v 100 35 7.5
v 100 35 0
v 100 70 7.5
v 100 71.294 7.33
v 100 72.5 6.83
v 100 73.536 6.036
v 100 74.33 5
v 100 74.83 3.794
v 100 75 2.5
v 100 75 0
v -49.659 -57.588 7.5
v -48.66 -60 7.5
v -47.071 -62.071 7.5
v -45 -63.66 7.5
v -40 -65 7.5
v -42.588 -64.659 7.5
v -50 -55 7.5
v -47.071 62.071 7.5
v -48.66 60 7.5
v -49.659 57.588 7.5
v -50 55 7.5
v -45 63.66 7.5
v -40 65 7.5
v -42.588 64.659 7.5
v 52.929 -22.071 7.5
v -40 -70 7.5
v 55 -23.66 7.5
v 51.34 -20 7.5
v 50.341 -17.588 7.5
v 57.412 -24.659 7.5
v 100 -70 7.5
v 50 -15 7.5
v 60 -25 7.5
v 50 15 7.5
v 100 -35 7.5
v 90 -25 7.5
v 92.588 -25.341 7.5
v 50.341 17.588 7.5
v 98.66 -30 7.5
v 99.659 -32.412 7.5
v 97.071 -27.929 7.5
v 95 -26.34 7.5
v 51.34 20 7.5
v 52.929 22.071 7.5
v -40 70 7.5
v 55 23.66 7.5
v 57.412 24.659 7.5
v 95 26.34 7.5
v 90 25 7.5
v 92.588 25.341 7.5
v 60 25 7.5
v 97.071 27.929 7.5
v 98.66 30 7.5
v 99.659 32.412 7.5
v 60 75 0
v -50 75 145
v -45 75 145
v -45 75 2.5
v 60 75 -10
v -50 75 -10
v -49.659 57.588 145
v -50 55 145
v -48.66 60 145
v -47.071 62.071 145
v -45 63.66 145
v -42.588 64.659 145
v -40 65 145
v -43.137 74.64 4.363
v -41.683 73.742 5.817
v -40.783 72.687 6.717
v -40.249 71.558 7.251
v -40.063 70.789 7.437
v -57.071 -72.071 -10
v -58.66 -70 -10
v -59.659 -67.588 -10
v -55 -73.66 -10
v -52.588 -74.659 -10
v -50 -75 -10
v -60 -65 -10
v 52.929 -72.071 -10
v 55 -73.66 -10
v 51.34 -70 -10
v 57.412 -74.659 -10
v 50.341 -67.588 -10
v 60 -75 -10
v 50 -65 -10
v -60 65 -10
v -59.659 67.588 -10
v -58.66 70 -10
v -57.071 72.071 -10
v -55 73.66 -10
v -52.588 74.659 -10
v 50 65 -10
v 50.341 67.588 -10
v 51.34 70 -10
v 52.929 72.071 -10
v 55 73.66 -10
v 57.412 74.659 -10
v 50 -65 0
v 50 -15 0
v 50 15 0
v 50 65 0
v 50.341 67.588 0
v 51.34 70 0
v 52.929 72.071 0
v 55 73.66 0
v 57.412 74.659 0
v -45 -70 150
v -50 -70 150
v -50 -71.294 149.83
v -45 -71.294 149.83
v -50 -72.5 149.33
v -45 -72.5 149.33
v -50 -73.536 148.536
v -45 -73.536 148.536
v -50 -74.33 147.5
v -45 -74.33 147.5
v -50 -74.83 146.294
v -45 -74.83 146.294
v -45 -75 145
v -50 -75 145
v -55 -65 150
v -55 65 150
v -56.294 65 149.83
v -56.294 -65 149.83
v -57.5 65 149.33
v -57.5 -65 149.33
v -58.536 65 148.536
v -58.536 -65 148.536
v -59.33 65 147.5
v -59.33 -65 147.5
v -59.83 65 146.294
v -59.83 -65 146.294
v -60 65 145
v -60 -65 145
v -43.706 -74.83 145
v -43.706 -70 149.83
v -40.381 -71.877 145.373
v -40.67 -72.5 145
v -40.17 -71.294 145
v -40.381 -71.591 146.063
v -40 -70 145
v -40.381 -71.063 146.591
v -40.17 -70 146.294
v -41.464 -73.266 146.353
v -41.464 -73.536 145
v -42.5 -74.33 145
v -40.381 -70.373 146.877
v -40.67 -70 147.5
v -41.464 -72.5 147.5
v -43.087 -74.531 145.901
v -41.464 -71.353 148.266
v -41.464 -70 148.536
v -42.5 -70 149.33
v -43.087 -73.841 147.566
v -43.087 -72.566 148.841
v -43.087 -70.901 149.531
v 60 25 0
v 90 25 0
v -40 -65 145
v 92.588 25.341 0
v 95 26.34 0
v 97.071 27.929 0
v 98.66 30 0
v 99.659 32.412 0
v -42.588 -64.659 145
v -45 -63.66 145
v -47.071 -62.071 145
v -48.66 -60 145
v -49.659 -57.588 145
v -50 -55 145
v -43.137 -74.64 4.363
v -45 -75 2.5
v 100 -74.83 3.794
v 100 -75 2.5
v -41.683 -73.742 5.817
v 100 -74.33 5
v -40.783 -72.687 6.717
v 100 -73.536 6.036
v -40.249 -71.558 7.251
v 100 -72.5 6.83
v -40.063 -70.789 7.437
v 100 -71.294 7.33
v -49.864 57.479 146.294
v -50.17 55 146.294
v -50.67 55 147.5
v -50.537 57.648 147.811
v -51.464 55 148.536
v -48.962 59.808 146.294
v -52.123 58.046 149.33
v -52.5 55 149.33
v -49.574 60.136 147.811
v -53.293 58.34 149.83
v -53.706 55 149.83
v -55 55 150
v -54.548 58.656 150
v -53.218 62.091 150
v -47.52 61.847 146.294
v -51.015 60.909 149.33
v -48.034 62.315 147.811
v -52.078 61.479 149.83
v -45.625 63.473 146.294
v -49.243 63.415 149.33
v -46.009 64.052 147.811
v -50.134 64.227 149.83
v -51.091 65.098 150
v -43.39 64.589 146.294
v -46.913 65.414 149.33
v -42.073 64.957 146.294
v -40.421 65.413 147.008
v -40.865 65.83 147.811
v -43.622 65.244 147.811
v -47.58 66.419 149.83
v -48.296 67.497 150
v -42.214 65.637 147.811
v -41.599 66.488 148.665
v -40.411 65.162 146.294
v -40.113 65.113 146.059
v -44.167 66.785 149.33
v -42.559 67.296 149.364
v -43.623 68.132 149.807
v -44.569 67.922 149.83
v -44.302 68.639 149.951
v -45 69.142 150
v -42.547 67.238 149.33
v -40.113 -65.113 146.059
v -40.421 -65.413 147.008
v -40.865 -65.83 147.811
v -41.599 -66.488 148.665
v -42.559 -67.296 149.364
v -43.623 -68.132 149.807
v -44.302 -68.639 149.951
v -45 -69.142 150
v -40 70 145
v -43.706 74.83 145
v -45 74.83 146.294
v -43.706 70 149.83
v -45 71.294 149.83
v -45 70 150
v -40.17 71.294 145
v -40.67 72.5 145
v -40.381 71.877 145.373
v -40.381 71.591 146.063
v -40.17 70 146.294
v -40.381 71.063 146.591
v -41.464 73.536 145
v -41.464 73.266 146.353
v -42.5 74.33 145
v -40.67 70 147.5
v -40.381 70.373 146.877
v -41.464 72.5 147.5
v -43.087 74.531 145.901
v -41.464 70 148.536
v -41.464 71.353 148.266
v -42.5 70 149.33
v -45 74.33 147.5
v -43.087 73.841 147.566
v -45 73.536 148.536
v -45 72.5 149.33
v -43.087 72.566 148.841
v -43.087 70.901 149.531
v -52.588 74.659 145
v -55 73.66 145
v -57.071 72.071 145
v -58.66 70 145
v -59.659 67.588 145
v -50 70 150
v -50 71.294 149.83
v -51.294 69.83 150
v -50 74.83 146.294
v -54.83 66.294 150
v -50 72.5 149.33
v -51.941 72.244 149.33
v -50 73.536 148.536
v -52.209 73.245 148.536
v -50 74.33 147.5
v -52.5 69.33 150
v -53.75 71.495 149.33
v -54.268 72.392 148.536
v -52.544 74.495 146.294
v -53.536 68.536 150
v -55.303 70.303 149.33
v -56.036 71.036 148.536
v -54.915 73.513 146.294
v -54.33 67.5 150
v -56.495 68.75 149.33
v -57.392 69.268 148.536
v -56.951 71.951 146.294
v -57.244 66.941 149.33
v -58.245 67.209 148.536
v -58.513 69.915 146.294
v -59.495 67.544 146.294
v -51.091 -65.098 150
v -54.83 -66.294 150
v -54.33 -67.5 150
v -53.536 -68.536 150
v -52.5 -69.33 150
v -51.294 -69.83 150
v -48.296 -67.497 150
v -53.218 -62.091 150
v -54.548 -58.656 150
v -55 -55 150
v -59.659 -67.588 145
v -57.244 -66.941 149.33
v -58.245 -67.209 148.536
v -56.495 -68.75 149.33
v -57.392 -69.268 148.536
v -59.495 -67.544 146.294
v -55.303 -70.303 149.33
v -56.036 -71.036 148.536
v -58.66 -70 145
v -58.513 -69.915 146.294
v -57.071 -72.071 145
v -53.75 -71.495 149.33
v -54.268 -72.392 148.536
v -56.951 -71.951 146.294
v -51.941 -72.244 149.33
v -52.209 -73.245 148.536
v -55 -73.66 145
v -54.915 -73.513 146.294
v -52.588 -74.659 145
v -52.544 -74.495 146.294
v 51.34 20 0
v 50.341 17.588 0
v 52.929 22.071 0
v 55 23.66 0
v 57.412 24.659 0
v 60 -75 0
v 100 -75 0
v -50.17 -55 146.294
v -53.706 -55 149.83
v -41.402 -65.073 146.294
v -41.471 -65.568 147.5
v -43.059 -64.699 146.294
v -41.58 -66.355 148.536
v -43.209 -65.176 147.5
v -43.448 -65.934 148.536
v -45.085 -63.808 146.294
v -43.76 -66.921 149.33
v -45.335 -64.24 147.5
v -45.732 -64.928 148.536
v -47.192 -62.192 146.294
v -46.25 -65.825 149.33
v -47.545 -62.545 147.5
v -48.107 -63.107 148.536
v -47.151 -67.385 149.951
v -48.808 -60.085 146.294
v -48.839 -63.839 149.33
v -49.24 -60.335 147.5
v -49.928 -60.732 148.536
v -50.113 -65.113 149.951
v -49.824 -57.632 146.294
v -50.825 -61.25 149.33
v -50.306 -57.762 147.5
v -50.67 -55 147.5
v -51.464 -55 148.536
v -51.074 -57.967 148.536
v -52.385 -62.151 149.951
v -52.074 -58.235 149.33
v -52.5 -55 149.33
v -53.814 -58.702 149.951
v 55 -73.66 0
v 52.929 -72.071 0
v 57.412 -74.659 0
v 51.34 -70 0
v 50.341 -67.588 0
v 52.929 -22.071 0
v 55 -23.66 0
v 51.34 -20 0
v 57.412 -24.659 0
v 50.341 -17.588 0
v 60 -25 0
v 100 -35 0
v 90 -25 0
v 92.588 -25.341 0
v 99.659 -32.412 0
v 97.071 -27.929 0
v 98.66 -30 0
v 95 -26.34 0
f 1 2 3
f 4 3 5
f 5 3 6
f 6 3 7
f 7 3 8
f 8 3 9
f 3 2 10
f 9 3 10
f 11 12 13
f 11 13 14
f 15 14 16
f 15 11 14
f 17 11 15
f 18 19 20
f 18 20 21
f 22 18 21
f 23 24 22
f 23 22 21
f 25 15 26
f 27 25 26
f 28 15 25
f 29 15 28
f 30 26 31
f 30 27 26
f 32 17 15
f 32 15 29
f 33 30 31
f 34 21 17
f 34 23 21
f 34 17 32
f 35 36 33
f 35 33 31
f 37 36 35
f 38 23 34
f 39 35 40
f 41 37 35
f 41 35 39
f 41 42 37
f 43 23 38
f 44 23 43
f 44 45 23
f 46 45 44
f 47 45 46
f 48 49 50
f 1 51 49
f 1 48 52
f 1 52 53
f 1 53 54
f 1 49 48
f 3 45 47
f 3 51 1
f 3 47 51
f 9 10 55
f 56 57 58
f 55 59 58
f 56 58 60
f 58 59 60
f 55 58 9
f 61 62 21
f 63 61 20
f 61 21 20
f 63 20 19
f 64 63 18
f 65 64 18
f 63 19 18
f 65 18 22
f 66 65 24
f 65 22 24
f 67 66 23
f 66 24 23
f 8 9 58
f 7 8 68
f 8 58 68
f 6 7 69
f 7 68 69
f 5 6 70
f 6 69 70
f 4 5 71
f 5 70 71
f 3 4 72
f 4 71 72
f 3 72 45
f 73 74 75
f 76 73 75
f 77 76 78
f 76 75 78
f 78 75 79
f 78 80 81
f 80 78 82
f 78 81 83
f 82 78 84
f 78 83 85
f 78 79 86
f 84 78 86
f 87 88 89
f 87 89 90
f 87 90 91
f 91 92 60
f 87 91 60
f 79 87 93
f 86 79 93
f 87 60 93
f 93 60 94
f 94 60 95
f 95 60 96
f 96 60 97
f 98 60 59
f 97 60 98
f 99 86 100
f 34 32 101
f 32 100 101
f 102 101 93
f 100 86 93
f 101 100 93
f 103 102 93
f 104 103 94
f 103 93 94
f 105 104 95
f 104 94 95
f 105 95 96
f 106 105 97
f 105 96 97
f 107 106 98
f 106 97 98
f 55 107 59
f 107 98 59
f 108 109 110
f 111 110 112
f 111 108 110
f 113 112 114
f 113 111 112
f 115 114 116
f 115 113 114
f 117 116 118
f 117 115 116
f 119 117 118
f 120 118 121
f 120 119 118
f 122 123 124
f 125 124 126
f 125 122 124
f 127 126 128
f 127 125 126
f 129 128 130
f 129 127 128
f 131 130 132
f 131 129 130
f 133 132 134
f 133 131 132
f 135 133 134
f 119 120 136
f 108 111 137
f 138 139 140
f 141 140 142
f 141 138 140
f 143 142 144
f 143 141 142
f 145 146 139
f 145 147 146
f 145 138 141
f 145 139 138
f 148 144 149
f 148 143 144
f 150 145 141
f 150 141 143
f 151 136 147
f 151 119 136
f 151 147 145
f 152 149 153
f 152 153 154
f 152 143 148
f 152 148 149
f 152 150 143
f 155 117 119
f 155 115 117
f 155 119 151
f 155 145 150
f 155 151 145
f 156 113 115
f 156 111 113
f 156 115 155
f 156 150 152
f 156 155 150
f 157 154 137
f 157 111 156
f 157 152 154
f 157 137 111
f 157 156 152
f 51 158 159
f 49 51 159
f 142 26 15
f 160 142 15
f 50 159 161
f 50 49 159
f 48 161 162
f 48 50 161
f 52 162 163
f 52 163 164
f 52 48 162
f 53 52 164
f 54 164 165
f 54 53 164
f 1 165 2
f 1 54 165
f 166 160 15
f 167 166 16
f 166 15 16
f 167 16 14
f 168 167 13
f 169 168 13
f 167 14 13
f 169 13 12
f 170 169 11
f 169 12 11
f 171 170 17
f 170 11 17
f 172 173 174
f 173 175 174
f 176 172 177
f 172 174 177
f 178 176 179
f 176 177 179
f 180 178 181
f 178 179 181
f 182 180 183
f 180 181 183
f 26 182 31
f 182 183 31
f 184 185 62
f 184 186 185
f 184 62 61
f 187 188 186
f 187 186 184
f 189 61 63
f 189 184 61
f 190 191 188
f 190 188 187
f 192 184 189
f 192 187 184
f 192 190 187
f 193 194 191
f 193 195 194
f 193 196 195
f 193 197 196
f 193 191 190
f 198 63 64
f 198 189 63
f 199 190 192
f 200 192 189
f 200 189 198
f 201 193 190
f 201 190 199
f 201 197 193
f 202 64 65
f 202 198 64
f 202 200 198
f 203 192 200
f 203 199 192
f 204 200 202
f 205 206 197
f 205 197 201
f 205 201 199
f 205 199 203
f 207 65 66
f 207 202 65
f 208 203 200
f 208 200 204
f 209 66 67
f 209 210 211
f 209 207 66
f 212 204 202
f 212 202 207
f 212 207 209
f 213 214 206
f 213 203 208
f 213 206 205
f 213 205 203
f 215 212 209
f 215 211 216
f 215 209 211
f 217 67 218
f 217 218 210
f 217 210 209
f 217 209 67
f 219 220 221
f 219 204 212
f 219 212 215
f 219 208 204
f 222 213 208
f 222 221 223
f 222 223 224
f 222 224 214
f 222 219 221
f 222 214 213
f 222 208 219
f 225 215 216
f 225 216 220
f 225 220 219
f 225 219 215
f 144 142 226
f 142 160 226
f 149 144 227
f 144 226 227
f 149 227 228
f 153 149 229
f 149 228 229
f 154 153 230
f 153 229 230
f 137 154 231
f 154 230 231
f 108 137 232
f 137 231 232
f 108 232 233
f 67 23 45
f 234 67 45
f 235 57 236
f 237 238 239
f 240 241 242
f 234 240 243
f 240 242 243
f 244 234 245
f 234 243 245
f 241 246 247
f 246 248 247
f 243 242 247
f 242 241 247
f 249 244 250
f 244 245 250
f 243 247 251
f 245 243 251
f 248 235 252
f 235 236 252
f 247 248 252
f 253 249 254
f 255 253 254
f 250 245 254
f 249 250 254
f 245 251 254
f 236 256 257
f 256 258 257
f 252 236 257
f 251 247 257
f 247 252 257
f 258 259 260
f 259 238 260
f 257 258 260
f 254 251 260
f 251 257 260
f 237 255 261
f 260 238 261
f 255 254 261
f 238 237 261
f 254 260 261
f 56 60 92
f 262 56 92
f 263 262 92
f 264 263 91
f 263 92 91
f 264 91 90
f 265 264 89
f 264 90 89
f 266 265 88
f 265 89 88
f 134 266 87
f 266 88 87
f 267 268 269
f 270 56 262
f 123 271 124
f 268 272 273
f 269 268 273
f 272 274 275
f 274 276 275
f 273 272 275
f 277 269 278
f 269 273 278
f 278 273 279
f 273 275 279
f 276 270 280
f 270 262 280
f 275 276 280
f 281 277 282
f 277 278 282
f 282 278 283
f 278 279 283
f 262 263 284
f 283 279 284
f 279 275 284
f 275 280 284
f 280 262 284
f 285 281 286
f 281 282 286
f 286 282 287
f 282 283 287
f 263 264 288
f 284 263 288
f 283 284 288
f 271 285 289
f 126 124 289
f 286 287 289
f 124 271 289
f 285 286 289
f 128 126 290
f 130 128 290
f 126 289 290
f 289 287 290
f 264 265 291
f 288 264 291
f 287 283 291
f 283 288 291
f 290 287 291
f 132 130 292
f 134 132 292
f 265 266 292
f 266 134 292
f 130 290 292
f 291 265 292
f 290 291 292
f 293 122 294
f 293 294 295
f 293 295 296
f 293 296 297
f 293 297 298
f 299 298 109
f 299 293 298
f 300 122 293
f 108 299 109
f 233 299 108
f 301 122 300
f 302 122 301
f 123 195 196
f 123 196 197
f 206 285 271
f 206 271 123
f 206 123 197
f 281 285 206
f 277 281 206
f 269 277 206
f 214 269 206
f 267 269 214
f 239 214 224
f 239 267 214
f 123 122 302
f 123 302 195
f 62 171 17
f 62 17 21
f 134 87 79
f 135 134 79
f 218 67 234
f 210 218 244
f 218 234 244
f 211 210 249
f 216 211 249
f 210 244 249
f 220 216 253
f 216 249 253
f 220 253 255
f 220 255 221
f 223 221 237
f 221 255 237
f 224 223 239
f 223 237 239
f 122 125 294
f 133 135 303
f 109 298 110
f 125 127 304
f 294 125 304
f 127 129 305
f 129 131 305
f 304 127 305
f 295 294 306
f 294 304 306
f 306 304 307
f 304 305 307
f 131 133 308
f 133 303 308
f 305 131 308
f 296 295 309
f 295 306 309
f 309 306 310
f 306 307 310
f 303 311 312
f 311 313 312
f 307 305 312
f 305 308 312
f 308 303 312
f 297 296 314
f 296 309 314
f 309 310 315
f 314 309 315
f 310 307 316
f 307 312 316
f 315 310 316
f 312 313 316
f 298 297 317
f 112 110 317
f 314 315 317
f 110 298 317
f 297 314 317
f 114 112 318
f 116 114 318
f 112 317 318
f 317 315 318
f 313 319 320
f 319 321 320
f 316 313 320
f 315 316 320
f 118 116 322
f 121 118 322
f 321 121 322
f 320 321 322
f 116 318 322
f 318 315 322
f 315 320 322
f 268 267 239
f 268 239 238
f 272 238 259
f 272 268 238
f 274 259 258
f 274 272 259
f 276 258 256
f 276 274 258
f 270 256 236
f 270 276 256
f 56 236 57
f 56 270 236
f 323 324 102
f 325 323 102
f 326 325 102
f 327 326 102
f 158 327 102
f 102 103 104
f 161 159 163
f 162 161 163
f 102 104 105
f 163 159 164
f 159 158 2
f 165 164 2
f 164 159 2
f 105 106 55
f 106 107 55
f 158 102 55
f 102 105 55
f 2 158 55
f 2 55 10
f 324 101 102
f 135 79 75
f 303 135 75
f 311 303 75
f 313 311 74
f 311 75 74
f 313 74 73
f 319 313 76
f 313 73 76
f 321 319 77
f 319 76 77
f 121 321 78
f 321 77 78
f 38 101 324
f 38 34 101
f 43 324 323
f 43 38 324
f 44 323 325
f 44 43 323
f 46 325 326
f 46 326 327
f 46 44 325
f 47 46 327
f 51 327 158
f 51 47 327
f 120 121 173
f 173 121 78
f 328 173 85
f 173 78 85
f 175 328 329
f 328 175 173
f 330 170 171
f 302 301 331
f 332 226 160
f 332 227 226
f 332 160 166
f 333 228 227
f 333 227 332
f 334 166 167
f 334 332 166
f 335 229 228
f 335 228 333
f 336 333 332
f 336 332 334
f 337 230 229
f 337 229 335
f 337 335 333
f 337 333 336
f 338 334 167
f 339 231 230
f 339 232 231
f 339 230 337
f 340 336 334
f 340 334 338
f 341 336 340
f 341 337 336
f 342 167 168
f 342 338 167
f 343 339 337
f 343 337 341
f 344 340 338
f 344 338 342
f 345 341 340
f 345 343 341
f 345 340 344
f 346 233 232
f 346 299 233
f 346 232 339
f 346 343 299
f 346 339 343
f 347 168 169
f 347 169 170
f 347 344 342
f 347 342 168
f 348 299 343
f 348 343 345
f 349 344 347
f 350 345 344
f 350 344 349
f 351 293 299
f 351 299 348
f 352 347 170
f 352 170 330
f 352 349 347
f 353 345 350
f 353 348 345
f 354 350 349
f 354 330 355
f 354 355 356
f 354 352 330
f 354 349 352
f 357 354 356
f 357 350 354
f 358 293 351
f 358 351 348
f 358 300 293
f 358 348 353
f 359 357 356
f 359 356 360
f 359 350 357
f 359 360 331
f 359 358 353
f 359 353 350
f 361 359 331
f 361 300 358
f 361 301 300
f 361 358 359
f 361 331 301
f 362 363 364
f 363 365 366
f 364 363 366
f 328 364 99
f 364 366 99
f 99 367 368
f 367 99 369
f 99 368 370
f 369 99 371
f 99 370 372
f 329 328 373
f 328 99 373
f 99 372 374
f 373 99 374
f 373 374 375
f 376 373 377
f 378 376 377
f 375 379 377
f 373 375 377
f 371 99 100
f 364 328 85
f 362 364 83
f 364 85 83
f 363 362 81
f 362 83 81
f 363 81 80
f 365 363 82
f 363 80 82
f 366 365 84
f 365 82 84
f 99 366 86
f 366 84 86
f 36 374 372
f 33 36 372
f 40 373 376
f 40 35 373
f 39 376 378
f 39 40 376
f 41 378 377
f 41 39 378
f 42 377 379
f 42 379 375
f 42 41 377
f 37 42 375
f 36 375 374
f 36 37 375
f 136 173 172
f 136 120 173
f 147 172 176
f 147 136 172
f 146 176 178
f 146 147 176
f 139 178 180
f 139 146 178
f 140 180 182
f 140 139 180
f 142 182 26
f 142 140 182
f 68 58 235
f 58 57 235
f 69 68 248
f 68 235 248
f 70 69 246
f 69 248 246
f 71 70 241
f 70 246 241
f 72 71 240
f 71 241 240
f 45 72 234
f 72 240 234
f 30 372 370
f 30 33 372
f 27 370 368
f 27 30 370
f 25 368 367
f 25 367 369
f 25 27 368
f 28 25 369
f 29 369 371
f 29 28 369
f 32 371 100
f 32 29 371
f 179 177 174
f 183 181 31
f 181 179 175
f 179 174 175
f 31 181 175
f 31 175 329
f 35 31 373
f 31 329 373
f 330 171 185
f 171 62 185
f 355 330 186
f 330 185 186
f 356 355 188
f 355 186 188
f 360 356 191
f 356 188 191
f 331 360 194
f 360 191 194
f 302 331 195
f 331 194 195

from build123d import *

# Parameters (mm, degrees)
BOSS_EXTRUDE1_DEPTH = 7.5
BOSS_EXTRUDE2_DEPTH = 150
BOSS_EXTRUDE3_START = -10
BOSS_EXTRUDE3_DEPTH = 10
FILLET1_R           = 5
FILLET2_R           = 10
FILLET3_R           = 10


with BuildPart() as part:
    # Sketch1 → Boss-Extrude1 (new body)
    with BuildSketch(Plane.XY):
        with BuildLine():
            Line((-40, 75), (-40, 65))
            ThreePointArc((-40, 65), (-47.071067812, 62.071067812), (-50, 55))
            Line((-50, 55), (-50, -55))
            ThreePointArc((-50, -55), (-47.071067812, -62.071067812), (-40, -65))
            Line((-40, -65), (-40, -75))
            Line((-40, -75), (100, -75))
            Line((100, -75), (100, -25))
            Line((100, -25), (50, -25))
            Line((50, -25), (50, 25))
            Line((50, 25), (100, 25))
            Line((100, 25), (100, 75))
            Line((100, 75), (-40, 75))
        make_face()
    extrude(amount=BOSS_EXTRUDE1_DEPTH)

    # Sketch1<5> → Boss-Extrude2 (add)
    with BuildSketch(Plane.XY):
        with BuildLine():
            ThreePointArc((-50, 55), (-47.071067812, 62.071067812), (-40, 65))
            Line((-40, 65), (-40, 75))
            Line((-40, 75), (-50, 75))
            ThreePointArc((-50, 75), (-57.071067812, 72.071067812), (-60, 65))
            Line((-60, 65), (-60, -65))
            ThreePointArc((-60, -65), (-57.071067812, -72.071067812), (-50, -75))
            Line((-50, -75), (-40, -75))
            Line((-40, -75), (-40, -65))
            ThreePointArc((-40, -65), (-47.071067812, -62.071067812), (-50, -55))
            Line((-50, -55), (-50, 55))
        make_face()
    extrude(amount=BOSS_EXTRUDE2_DEPTH)

    # Sketch1<6> → Boss-Extrude3 (add)
    with BuildSketch(Plane.XY.offset(BOSS_EXTRUDE3_START)):
        with BuildLine():
            Line((-50, -75), (60, -75))
            ThreePointArc((60, -75), (52.928932188, -72.071067812), (50, -65))
            Line((50, -65), (50, 65))
            ThreePointArc((50, 65), (52.928932188, 72.071067812), (60, 75))
            Line((60, 75), (-50, 75))
            ThreePointArc((-50, 75), (-57.071067812, 72.071067812), (-60, 65))
            Line((-60, 65), (-60, -65))
            ThreePointArc((-60, -65), (-57.071067812, -72.071067812), (-50, -75))
        make_face()
    extrude(amount=BOSS_EXTRUDE3_DEPTH)

    # Fillet1
    fillet1_edges = [part.edges().sort_by_distance(p)[0] for p in [
        (30, 75, 7.5),
        (-57.071067812, -72.071067812, 150),
        (30, -75, 7.5),
        (-40, -75, 78.75),
        (-40, -70, 150),
        (-47.071067812, -62.071067812, 150),
        (-45, 75, 150),
        (-40, 75, 78.75),
        (-57.071067812, 72.071067812, 150),
        (-60, 0, 150),
        (-45, -75, 150),
        (-50, 0, 150),
        (-47.071067812, 62.071067812, 150),
        (-40, 70, 150),
    ]]
    fillet(fillet1_edges, radius=FILLET1_R - 0.0001)  # a hair under: the kernel refuses the full size

    # Fillet2
    fillet2_edges = [part.edges().sort_by_distance(p)[0] for p in [
        (100, 25, 3.75),
        (100, -25, 3.75),
    ]]
    fillet(fillet2_edges, radius=FILLET2_R)

    # Fillet3
    fillet3_edges = [part.edges().sort_by_distance(p)[0] for p in [
        (50, 25, 3.75),
        (50, -25, 3.75),
    ]]
    fillet(fillet3_edges, radius=FILLET3_R)


solid = part.part
